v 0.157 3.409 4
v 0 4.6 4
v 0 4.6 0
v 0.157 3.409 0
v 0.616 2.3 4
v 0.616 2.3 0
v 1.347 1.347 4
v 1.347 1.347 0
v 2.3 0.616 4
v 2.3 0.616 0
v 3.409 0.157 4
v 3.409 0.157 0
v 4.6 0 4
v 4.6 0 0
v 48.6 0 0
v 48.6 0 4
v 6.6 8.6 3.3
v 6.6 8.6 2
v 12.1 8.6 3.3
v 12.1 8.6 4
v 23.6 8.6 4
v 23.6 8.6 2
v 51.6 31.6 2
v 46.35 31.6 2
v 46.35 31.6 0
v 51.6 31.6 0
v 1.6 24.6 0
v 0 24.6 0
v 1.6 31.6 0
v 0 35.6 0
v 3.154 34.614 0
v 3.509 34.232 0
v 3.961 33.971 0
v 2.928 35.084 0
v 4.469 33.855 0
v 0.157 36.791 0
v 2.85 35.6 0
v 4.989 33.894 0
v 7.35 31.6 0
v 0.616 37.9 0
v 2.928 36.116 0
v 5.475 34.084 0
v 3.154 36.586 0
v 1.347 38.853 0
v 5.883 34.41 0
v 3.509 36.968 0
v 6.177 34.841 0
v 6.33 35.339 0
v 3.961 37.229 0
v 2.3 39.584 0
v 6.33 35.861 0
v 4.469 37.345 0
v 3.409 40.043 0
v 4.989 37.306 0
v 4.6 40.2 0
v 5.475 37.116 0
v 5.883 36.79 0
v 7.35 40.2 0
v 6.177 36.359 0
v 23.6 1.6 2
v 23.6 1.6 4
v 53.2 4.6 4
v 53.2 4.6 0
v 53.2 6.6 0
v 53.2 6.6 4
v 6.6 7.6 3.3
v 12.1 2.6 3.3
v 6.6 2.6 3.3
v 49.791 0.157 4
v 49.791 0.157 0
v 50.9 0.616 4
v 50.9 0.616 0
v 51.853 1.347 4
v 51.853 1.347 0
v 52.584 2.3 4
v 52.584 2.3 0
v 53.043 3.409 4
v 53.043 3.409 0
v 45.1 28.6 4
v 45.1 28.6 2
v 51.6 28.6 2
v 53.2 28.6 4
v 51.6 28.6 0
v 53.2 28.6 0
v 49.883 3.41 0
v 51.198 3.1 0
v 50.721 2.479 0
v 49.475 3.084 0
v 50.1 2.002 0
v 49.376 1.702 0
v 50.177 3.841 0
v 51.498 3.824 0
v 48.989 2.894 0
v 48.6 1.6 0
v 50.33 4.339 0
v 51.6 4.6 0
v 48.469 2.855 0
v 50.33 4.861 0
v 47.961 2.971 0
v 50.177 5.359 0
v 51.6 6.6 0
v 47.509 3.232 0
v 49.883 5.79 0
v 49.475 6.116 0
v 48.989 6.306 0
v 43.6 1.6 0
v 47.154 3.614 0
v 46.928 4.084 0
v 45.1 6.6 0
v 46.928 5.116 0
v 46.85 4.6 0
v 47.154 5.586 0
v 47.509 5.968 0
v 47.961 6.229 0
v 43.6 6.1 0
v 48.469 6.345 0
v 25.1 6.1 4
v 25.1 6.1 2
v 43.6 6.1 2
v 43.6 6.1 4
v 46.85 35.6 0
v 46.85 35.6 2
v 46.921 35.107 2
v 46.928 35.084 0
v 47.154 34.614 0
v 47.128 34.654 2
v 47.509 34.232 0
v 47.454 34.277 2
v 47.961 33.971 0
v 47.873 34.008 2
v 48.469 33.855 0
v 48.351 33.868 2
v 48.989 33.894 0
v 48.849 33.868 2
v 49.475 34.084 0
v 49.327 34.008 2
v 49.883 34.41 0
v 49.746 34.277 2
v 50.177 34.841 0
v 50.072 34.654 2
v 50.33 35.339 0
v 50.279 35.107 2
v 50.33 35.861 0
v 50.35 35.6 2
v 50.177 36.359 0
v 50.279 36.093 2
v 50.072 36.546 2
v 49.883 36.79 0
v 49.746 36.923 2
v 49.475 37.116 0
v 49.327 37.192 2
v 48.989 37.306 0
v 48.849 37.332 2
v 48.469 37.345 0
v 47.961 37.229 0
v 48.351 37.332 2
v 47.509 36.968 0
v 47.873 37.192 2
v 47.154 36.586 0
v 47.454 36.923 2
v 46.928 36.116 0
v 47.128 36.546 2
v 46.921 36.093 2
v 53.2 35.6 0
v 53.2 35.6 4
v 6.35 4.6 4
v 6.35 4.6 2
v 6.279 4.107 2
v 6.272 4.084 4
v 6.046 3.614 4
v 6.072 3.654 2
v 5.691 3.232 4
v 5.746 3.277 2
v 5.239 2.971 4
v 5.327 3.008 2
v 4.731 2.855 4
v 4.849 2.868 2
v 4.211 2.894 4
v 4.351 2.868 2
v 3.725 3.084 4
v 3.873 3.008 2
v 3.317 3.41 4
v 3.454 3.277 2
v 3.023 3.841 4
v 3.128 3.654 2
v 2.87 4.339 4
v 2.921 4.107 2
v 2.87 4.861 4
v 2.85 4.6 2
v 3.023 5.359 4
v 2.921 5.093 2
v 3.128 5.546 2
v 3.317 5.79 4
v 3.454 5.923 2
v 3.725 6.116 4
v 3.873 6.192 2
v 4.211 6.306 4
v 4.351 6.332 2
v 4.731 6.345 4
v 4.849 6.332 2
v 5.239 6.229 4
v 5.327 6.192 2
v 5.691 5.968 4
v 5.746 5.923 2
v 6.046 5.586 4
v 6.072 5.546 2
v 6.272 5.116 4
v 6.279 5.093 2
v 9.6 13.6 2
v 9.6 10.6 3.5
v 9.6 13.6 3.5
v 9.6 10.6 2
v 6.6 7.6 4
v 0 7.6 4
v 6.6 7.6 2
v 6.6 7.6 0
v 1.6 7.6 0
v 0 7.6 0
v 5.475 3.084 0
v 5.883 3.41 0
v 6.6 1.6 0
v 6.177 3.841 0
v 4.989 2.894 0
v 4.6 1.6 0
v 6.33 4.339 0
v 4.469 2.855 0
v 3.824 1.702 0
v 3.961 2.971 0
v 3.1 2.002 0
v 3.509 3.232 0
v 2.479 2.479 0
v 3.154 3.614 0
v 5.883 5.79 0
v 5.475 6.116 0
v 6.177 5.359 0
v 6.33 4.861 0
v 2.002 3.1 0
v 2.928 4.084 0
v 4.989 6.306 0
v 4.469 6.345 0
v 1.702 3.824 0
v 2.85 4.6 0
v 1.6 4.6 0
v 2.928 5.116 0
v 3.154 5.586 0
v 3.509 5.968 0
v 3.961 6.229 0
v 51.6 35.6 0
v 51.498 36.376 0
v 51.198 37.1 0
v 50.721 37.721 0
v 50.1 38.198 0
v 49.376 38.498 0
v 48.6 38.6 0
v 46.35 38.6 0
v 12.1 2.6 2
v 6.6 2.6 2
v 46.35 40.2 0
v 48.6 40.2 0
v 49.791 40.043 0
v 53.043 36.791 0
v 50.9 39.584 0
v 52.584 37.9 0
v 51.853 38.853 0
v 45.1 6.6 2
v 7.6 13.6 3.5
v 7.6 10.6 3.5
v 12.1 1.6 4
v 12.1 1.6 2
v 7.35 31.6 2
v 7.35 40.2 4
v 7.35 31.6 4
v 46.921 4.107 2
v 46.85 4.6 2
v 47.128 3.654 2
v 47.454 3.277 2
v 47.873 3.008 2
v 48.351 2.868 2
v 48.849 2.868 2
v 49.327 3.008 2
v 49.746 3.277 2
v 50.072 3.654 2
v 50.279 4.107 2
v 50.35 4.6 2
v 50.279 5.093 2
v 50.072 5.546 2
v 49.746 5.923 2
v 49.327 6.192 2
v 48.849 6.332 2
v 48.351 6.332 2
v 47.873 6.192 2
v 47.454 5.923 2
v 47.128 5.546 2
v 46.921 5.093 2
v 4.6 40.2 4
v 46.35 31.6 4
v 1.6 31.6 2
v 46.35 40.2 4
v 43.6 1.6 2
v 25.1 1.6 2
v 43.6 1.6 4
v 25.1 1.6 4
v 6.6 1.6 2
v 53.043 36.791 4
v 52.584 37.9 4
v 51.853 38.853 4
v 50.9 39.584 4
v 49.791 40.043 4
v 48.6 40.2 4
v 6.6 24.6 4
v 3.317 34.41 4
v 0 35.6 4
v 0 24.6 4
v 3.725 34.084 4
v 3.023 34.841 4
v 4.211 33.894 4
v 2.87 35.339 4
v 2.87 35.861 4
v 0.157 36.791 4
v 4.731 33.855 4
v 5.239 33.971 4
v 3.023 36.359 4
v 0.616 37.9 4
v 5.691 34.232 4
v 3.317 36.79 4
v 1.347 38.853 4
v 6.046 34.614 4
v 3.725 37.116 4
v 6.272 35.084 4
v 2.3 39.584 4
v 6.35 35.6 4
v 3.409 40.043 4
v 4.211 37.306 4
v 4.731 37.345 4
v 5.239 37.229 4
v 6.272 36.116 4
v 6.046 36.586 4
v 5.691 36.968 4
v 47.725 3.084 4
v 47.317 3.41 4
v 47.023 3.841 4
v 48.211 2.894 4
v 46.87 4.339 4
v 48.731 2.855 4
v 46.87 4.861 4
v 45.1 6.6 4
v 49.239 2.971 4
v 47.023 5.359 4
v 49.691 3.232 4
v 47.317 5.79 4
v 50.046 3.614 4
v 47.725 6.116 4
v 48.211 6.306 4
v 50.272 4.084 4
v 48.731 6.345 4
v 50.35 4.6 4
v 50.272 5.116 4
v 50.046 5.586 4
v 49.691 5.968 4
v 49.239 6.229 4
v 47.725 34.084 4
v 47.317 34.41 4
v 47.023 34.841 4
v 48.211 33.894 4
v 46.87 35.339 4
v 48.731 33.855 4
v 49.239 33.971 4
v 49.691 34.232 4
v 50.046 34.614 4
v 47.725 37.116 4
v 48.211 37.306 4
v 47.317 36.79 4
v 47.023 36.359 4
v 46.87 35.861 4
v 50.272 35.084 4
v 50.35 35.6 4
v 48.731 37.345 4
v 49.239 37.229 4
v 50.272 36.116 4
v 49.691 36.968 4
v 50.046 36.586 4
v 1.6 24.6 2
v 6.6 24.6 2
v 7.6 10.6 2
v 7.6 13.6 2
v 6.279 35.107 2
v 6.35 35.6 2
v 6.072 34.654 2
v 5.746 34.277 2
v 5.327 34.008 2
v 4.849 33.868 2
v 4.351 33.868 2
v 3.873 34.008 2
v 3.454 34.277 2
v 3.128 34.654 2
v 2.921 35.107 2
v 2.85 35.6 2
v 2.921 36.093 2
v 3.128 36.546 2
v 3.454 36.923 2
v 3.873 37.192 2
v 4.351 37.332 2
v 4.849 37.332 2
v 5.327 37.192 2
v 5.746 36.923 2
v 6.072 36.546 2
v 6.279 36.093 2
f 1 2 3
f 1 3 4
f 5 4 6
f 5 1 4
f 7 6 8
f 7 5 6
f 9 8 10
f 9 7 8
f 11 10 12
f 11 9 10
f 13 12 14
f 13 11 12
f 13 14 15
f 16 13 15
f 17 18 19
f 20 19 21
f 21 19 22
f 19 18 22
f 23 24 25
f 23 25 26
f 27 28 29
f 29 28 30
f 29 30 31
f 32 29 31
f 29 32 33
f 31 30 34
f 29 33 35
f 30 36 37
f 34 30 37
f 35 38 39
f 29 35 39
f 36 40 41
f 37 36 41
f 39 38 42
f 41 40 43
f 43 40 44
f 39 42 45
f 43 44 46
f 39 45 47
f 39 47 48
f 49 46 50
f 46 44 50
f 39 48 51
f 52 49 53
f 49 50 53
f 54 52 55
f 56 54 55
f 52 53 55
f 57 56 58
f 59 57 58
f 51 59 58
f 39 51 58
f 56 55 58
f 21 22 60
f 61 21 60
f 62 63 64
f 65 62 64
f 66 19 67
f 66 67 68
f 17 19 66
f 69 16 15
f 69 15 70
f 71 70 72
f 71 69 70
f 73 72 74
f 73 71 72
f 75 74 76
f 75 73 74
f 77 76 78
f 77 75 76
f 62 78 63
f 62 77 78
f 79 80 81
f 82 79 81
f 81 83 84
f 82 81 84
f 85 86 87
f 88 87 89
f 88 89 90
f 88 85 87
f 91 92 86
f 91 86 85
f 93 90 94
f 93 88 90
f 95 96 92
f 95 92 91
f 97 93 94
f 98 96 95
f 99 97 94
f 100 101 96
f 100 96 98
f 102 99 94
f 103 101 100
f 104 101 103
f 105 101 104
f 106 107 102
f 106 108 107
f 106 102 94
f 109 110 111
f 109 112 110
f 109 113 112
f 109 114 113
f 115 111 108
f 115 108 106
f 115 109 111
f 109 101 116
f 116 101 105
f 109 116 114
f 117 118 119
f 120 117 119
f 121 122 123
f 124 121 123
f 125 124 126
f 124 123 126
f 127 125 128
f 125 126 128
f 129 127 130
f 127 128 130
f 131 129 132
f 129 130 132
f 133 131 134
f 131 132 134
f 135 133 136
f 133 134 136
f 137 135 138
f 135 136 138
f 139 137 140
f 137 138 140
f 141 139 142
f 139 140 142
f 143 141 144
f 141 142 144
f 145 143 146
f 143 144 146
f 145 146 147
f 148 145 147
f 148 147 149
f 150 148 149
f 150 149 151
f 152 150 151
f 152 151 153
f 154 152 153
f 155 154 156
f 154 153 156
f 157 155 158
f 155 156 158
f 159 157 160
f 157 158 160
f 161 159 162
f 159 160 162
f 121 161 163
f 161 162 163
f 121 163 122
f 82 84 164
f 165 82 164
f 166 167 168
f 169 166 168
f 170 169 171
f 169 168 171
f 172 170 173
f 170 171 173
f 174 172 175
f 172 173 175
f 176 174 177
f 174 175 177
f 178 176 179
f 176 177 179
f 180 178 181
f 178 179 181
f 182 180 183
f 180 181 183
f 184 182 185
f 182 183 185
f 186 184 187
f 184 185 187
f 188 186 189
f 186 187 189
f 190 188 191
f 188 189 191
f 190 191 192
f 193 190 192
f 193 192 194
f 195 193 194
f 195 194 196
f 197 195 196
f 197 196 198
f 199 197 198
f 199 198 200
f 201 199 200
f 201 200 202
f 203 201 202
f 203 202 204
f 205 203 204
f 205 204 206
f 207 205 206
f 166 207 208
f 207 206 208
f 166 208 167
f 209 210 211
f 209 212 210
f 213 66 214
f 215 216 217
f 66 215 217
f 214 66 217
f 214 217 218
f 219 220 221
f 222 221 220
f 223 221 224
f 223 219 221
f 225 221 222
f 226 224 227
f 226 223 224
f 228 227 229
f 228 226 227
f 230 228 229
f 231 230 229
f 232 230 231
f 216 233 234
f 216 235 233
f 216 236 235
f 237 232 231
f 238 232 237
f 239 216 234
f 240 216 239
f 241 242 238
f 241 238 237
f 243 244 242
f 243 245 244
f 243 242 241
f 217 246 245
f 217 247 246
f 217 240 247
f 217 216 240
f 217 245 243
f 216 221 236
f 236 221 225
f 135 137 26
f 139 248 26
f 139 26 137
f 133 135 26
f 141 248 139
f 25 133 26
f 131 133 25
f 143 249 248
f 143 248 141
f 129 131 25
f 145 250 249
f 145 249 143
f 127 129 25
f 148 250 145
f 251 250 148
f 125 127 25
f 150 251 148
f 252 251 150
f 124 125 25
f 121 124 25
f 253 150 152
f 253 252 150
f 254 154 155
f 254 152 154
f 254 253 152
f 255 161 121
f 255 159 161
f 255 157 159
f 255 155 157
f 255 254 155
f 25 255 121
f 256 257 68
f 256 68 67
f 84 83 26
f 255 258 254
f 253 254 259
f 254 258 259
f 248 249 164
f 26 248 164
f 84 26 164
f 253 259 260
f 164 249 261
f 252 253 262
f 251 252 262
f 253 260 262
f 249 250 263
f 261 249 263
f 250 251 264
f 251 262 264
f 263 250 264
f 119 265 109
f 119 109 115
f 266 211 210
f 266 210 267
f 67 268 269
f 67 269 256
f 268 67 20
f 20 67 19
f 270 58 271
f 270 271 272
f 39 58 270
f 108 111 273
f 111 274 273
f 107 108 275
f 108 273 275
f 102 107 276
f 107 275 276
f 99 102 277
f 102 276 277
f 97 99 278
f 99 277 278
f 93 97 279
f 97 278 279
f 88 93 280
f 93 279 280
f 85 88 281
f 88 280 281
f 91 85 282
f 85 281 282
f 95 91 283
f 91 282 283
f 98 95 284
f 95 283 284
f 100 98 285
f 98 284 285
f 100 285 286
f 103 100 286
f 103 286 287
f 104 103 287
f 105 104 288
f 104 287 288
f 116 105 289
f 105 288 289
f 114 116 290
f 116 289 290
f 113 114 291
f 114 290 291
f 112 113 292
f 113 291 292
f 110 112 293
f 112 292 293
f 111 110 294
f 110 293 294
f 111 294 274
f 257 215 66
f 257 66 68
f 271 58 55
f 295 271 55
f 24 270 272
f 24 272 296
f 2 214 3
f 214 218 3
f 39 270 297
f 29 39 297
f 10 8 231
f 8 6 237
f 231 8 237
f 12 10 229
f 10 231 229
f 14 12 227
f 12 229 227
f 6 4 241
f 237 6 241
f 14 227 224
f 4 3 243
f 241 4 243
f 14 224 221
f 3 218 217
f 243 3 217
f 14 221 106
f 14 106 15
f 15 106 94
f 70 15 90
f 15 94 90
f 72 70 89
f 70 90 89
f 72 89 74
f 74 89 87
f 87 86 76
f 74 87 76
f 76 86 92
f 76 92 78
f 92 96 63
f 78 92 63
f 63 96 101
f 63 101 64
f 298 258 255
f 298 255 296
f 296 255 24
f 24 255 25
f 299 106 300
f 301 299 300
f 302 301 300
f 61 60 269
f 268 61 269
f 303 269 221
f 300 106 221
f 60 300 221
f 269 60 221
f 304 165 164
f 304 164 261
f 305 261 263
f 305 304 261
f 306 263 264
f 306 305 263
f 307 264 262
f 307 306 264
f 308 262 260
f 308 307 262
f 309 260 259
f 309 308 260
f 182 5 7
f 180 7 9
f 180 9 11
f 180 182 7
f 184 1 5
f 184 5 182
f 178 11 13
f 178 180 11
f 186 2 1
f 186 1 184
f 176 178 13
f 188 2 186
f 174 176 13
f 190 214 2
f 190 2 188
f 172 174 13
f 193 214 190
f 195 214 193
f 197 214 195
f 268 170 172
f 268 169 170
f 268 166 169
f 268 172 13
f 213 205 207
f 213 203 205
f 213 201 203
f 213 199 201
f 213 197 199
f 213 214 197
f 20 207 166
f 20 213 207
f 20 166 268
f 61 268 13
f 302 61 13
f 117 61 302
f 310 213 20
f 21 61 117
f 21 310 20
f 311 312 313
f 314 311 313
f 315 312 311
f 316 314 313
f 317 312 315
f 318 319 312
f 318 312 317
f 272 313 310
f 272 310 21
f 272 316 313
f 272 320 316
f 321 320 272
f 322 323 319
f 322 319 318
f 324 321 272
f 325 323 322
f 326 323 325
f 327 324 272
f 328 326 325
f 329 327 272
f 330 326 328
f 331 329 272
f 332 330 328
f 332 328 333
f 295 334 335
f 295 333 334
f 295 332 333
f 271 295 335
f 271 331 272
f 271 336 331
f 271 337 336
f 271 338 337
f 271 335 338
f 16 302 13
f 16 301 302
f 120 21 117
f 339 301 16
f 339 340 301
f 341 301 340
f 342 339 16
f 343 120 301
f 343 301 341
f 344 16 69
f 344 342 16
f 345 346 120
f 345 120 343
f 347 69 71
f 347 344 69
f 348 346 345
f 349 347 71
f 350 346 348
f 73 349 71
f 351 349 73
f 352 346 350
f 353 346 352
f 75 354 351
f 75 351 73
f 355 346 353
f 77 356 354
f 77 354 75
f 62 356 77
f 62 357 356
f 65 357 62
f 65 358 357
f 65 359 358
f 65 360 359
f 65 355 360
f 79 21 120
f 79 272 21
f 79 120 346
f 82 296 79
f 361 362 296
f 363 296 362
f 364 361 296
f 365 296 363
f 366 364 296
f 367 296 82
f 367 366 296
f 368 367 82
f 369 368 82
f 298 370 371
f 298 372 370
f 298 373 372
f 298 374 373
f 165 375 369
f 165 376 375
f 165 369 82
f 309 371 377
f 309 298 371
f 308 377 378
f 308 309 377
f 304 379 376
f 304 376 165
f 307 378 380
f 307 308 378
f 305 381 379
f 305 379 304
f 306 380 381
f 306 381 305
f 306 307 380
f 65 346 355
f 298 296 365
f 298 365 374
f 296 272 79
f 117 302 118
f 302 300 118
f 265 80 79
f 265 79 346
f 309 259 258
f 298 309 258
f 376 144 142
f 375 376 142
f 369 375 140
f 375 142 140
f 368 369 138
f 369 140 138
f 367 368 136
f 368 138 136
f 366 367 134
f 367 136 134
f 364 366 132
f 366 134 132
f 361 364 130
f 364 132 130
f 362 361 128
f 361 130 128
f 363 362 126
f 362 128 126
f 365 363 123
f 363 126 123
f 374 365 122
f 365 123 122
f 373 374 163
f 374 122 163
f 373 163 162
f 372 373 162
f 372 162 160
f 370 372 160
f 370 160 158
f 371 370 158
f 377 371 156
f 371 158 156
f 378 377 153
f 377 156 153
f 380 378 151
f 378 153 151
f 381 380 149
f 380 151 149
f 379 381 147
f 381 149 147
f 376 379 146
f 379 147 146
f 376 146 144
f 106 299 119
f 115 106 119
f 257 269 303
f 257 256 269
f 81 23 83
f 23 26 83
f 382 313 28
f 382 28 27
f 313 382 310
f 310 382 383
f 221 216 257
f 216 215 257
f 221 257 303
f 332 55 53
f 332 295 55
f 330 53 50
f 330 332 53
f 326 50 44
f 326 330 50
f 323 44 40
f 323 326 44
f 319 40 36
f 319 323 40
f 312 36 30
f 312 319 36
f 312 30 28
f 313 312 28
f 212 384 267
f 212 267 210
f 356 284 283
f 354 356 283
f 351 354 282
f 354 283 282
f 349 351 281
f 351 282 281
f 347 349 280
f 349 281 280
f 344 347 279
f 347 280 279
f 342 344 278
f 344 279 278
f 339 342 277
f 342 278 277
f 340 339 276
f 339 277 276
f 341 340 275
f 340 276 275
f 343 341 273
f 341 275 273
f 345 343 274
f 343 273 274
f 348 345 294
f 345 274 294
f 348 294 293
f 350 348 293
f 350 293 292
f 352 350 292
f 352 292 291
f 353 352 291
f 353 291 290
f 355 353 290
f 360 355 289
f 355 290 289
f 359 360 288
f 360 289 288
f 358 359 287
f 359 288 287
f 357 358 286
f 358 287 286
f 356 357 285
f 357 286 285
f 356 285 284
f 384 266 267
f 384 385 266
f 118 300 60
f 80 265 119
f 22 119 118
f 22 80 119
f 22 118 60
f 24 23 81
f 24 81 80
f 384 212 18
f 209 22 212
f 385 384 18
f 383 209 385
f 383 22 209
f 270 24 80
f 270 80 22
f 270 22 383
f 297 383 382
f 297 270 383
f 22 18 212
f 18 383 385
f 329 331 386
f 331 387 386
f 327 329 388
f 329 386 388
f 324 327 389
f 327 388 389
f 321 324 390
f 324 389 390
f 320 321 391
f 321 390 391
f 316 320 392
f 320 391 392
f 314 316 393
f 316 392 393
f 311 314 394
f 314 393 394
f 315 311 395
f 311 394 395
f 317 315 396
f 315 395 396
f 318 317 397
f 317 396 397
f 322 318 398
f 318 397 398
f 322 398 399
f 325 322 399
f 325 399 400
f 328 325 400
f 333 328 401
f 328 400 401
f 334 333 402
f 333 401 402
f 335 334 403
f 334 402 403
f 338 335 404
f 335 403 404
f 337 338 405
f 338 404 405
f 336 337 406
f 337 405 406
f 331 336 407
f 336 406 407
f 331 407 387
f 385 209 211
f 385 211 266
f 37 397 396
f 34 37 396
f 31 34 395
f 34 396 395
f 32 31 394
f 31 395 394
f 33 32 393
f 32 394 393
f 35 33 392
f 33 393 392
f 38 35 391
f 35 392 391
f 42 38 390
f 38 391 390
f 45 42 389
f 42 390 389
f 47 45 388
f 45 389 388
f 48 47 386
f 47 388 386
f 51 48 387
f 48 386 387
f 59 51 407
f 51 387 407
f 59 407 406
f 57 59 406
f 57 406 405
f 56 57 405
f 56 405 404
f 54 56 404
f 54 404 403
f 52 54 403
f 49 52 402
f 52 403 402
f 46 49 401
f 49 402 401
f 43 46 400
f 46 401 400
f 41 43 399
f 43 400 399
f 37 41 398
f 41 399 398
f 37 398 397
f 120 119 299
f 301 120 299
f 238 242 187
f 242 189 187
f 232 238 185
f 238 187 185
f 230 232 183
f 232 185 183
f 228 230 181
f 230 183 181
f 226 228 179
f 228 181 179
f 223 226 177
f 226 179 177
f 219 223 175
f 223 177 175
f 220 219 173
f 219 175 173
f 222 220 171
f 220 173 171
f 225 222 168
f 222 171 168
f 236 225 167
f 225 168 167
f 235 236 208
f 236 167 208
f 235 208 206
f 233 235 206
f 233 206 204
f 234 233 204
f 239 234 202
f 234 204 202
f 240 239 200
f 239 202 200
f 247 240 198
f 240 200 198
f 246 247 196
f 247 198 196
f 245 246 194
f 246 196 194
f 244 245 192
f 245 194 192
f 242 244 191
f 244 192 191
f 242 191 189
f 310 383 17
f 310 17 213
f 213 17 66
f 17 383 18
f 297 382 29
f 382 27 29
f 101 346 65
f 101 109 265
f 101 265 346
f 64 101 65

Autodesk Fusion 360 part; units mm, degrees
sketch "Sketch1" plane through (0, 0, 0) normal (0, 0, 1) x (1, 0, 0)
  line L0 (0, 0) -> (53.2, 0)
  line L1 (53.2, 0) -> (53.2, 40.2)
  line L2 (53.2, 40.2) -> (0, 40.2)
  line L3 (0, 40.2) -> (0, 0)
  circle A0 centre (4.6, 4.6) radius 1.75
  circle A1 centre (4.6, 35.6) radius 1.75
  circle A2 centre (48.6, 35.6) radius 1.75
  circle A3 centre (48.6, 4.6) radius 1.75
  dimension "d1" = 53.2
  dimension "d2" = 40.2
  dimension "d3" = 4.6
  dimension "d4" = 4.6
  dimension "d5" = 4.6
  dimension "d6" = 4.6
  dimension "d7" = 4.6
  dimension "d8" = 4.6
  dimension "d9" = 4.6
  dimension "d10" = 4.6
  dimension "d11" = 3.5
  dimension "d12" = 3.5
  dimension "d13" = 3.5
  dimension "d14" = 3.5
extrude "Extrude1" add sketch "Sketch1" along normal blind 4
fillet "Fillet1" radius 4.6 4 edges at (0, 40.2, 2) (0, 0, 2) (53.2, 0, 2) (53.2, 40.2, 2)
sketch "Sketch2" plane through (0, 0, 0) normal (0, 0, -1) x (-1, 0, 0)
  arc A0 (-48.6, 40.2) -> (-53.2, 35.6) centre (-48.6, 35.6) ccw
  line L0 (-53.2, 35.6) -> (-53.2, 4.6)
  arc A1 (-53.2, 4.6) -> (-48.6, 0) centre (-48.6, 4.6) ccw
  line L1 (-48.6, 0) -> (-4.6, 0)
  arc A2 (-4.6, 0) -> (0, 4.6) centre (-4.6, 4.6) ccw
  line L2 (0, 4.6) -> (0, 35.6)
  arc A3 (0, 35.6) -> (-4.6, 40.2) centre (-4.6, 35.6) ccw
  line L3 (-4.6, 40.2) -> (-48.6, 40.2)
  circle A4 centre (-48.6, 4.6) radius 1.75
  circle A5 centre (-48.6, 35.6) radius 1.75
  circle A6 centre (-4.6, 4.6) radius 1.75
  circle A7 centre (-4.6, 35.6) radius 1.75
  line L4 (-51.6, 35.6) -> (-51.6, 4.6)
  arc A8 (-51.6, 4.6) -> (-48.6, 1.6) centre (-48.6, 4.6) ccw
  line L5 (-48.6, 1.6) -> (-4.6, 1.6)
  arc A9 (-4.6, 1.6) -> (-1.6, 4.6) centre (-4.6, 4.6) ccw
  line L6 (-1.6, 4.6) -> (-1.6, 35.6)
  arc A10 (-1.6, 35.6) -> (-4.6, 38.6) centre (-4.6, 35.6) ccw
  line L7 (-4.6, 38.6) -> (-48.6, 38.6)
  arc A11 (-48.6, 38.6) -> (-51.6, 35.6) centre (-48.6, 35.6) ccw
  dimension "d18" = 1.6
extrude "Extrude2" cut sketch "Sketch2" against normal blind 2 contours L4 A8 L5 A9 L6 A10 L7 A11
sketch "Sketch3" plane through (0, 0, 0) normal (0, 0, -1) x (-1, 0, 0)
  line L0 (-51.6, 4.6) -> (-51.6, 35.6)
  arc A0 (-48.6, 38.6) -> (-51.6, 35.6) centre (-48.6, 35.6) ccw
  line L1 (-48.6, 38.6) -> (-4.6, 38.6)
  arc A1 (-1.6, 35.6) -> (-4.6, 38.6) centre (-4.6, 35.6) ccw
  line L2 (-1.6, 35.6) -> (-1.6, 4.6)
  arc A2 (-4.6, 1.6) -> (-1.6, 4.6) centre (-4.6, 4.6) ccw
  line L3 (-4.6, 1.6) -> (-48.6, 1.6)
  arc A3 (-51.6, 4.6) -> (-48.6, 1.6) centre (-48.6, 4.6) ccw
  arc A4 (-48.6, 40.2) -> (-53.2, 35.6) centre (-48.6, 35.6) ccw
  line L4 (-53.2, 35.6) -> (-53.2, 4.6)
  arc A5 (-53.2, 4.6) -> (-48.6, 0) centre (-48.6, 4.6) ccw
  line L5 (-48.6, 0) -> (-4.6, 0)
  arc A6 (-4.6, 0) -> (0, 4.6) centre (-4.6, 4.6) ccw
  line L6 (0, 4.6) -> (0, 35.6)
  arc A7 (0, 35.6) -> (-4.6, 40.2) centre (-4.6, 35.6) ccw
  line L7 (-4.6, 40.2) -> (-48.6, 40.2)
  line L8 (0, 24.6) -> (-1.6, 24.6)
  line L9 (0, 7.6) -> (-1.6, 7.6)
  line L10 (-53.2, 28.6) -> (-51.6, 28.6)
  line L11 (-53.2, 6.6) -> (-51.6, 6.6)
  line L12 (-46.35, 40.2) -> (-46.35, 38.6)
  line L13 (-7.35, 40.2) -> (-7.35, 38.6)
  dimension "d21" = 17
  dimension "d22" = 11
  dimension "d25" = 5
  dimension "d26" = 10
  dimension "d27" = 5.75
  dimension "d73" = 39
extrude "Extrude3" cut sketch "Sketch3" against normal blind 2 contours L0 L4 L10 L11 | L2 L6 L8 L9 | L1 L7 L12 L13
sketch "Sketch4" plane through (0, 0, 2) normal (0, 0, -1) x (-1, 0, 0)
  circle A0 centre (-48.6, 4.6) radius 1.75
  circle A1 centre (-4.6, 35.6) radius 1.75
  circle A2 centre (-4.6, 4.6) radius 1.75
  circle A3 centre (-48.6, 35.6) radius 1.75
  line L0 (-53.2, 28.6) -> (-53.2, 6.6)
  line L1 (0, 7.6) -> (0, 24.6)
  line L2 (-7.35, 40.2) -> (-46.35, 40.2)
  arc A4 (-48.6, 38.6) -> (-51.6, 35.6) centre (-48.6, 35.6) ccw
  line L3 (-51.6, 35.6) -> (-51.6, 28.6)
  line L4 (-51.6, 28.6) -> (-53.2, 28.6)
  line L5 (-53.2, 6.6) -> (-51.6, 6.6)
  line L6 (-51.6, 6.6) -> (-51.6, 4.6)
  arc A5 (-51.6, 4.6) -> (-48.6, 1.6) centre (-48.6, 4.6) ccw
  line L7 (-48.6, 1.6) -> (-4.6, 1.6)
  arc A6 (-4.6, 1.6) -> (-1.6, 4.6) centre (-4.6, 4.6) ccw
  line L8 (-1.6, 4.6) -> (-1.6, 7.6)
  line L9 (-1.6, 7.6) -> (0, 7.6)
  line L10 (0, 24.6) -> (-1.6, 24.6)
  line L11 (-1.6, 24.6) -> (-1.6, 35.6)
  arc A7 (-1.6, 35.6) -> (-4.6, 38.6) centre (-4.6, 35.6) ccw
  line L12 (-4.6, 38.6) -> (-7.35, 38.6)
  line L13 (-7.35, 38.6) -> (-7.35, 40.2)
  line L14 (-46.35, 40.2) -> (-46.35, 38.6)
  line L15 (-46.35, 38.6) -> (-48.6, 38.6)
  line L16 (-51.6, 28.6) -> (-45.1, 28.6)
  line L17 (-45.1, 28.6) -> (-45.1, 6.6)
  line L18 (-45.1, 6.6) -> (-51.6, 6.6)
  line L19 (-7.35, 38.6) -> (-7.35, 31.6)
  line L20 (-7.35, 31.6) -> (-46.35, 31.6)
  line L21 (-46.35, 31.6) -> (-46.35, 38.6)
  line L22 (-1.6, 24.6) -> (-6.6, 24.6)
  line L23 (-6.6, 24.6) -> (-6.6, 7.6)
  line L24 (-6.6, 7.6) -> (-1.6, 7.6)
  line L25 (-12.1, 1.6) -> (-12.1, 8.6)
  line L26 (-12.1, 8.6) -> (-23.6, 8.6)
  line L27 (-23.6, 8.6) -> (-23.6, 1.6)
  line L28 (-25.1, 1.6) -> (-25.1, 6.1)
  line L29 (-25.1, 6.1) -> (-43.6, 6.1)
  line L30 (-43.6, 6.1) -> (-43.6, 1.6)
  dimension "d74" = 6.5
  dimension "d75" = 7
  dimension "d76" = 5
  dimension "d77" = 10.5
  dimension "d78" = 11.5
  dimension "d79" = 7
  dimension "d80" = 4.5
  dimension "d81" = 23.5
  dimension "d82" = 18.5
extrude "Extrude4" cut sketch "Sketch4" against normal blind 2 contours L0 L4 L5 L16 L17 L18 | L2 L13 L14 L19 L20 L21 | L7 L28 L29 L30 | L7 L25 L26 L27 | L1 L9 L10 L22 L23 L24
sketch "Sketch5" plane through (0, 0, 2) normal (0, 0, -1) x (-1, 0, 0)
  line L0 (-51.6, 35.6) -> (-51.6, 28.6)
  line L1 (-48.6, 1.6) -> (-43.6, 1.6)
  line L2 (-1.6, 7.6) -> (-6.6, 7.6)
  line L3 (-6.6, 24.6) -> (-1.6, 24.6)
  line L4 (-7.35, 38.6) -> (-7.35, 31.6)
  line L5 (-4.6, 38.6) -> (-7.35, 38.6)
  line L6 (-46.35, 31.6) -> (-46.35, 38.6)
  line L7 (-51.6, 28.6) -> (-45.1, 28.6)
  line L8 (-45.1, 6.6) -> (-51.6, 6.6)
  circle A0 centre (-48.6, 35.6) radius 1.75
  circle A1 centre (-4.6, 4.6) radius 1.75
  circle A2 centre (-4.6, 35.6) radius 1.75
  circle A3 centre (-48.6, 4.6) radius 1.75
  line L9 (-12.6, 8.6) -> (-6.6, 8.6)
  line L10 (-6.6, 8.6) -> (-6.6, 2.6)
  line L11 (-6.6, 2.6) -> (-12.6, 2.6)
  line L12 (-12.6, 2.6) -> (-12.6, 8.6)
  arc A4 (-4.6, 1.6) -> (-1.6, 4.6) centre (-4.6, 4.6) ccw
  line L13 (-1.6, 4.6) -> (-1.6, 7.6)
  line L14 (-1.6, 24.6) -> (-1.6, 35.6)
  arc A5 (-1.6, 35.6) -> (-4.6, 38.6) centre (-4.6, 35.6) ccw
  line L15 (-46.35, 38.6) -> (-48.6, 38.6)
  arc A6 (-48.6, 38.6) -> (-51.6, 35.6) centre (-48.6, 35.6) ccw
  line L16 (-51.6, 6.6) -> (-51.6, 4.6)
  arc A7 (-51.6, 4.6) -> (-48.6, 1.6) centre (-48.6, 4.6) ccw
  line L17 (-45.1, 28.6) -> (-45.1, 6.6)
  line L18 (-43.6, 1.6) -> (-43.6, 6.1)
  line L19 (-43.6, 6.1) -> (-25.1, 6.1)
  line L20 (-25.1, 6.1) -> (-25.1, 1.6)
  line L21 (-25.1, 1.6) -> (-23.6, 1.6)
  line L22 (-23.6, 1.6) -> (-23.6, 8.6)
  line L23 (-23.6, 8.6) -> (-12.1, 8.6)
  line L24 (-12.1, 8.6) -> (-12.1, 1.6)
  line L25 (-12.1, 1.6) -> (-4.6, 1.6)
  line L26 (-6.6, 7.6) -> (-6.6, 24.6)
  line L27 (-7.35, 31.6) -> (-46.35, 31.6)
  dimension "d49" = 6
  dimension "d51" = 6
  dimension "d83" = 1
  dimension "d84" = 5
extrude "Extrude5" cut sketch "Sketch5" against normal blind 1.3 contours L9 L10 L11 L24 L26 | L9 L11 L12 L23 L24
sketch "Sketch8" plane through (0, 0, 2) normal (0, 0, -1) x (-1, 0, 0)
  line L0 (-6.6, 24.6) -> (-1.6, 24.6)
  line L1 (-7.35, 38.6) -> (-7.35, 31.6)
  line L2 (-4.6, 38.6) -> (-7.35, 38.6)
  line L3 (-46.35, 31.6) -> (-46.35, 38.6)
  line L4 (-51.6, 28.6) -> (-45.1, 28.6)
  line L5 (-45.1, 6.6) -> (-51.6, 6.6)
  line L6 (-51.6, 35.6) -> (-51.6, 28.6)
  line L7 (-48.6, 1.6) -> (-43.6, 1.6)
  line L8 (-23.6, 8.6) -> (-6.6, 8.6)
  circle A0 centre (-48.6, 35.6) radius 1.75
  circle A1 centre (-4.6, 35.6) radius 1.75
  circle A2 centre (-48.6, 4.6) radius 1.75
  arc A3 (-1.6, 35.6) -> (-4.6, 38.6) centre (-4.6, 35.6) ccw
  line L9 (-46.35, 38.6) -> (-48.6, 38.6)
  arc A4 (-48.6, 38.6) -> (-51.6, 35.6) centre (-48.6, 35.6) ccw
  line L10 (-51.6, 6.6) -> (-51.6, 4.6)
  arc A5 (-51.6, 4.6) -> (-48.6, 1.6) centre (-48.6, 4.6) ccw
  line L11 (-6.6, 8.6) -> (-6.6, 24.6)
  line L12 (-7.35, 31.6) -> (-46.35, 31.6)
  line L13 (-45.1, 28.6) -> (-45.1, 6.6)
  line L14 (-43.6, 1.6) -> (-43.6, 6.1)
  line L15 (-43.6, 6.1) -> (-25.1, 6.1)
  line L16 (-25.1, 6.1) -> (-25.1, 1.6)
  line L17 (-25.1, 1.6) -> (-23.6, 1.6)
  line L18 (-23.6, 1.6) -> (-23.6, 8.6)
  line L19 (-1.6, 24.6) -> (-1.6, 35.6)
  line L20 (-45.1, 6.6) -> (-43.6, 6.1)
  line L21 (-7.35, 31.6) -> (-1.6, 31.6)
  line L22 (-46.35, 31.6) -> (-46.6643, 31.6)
  line L23 (-46.6643, 31.6) -> (-51.6, 31.6)
  line L24 (-6.6, 7.6) -> (-6.6, 2.6)
  line L25 (-6.6, 2.6) -> (-12.1, 2.6)
  line L26 (-12.1, 2.6) -> (-12.1, 1.6)
  line L27 (-12.1, 1.6) -> (-4.6, 1.6)
  arc A6 (-4.6, 1.6) -> (-1.6, 4.6) centre (-4.6, 4.6) ccw
  line L28 (-1.6, 4.6) -> (-1.6, 7.6)
  line L29 (-1.6, 7.6) -> (-6.6, 7.6)
  circle A7 centre (-4.6, 4.6) radius 1.75
  line L30 (-6.6, 2.6) -> (-6.6, 1.6)
extrude "Extrude8" add sketch "Sketch8" along normal blind 2 contours L1 L2 A3 L19 L21 | L3 L6 L9 A4 L22 L23 | L5 L7 L10 A5 L14 L20 | L24 L27 A6 L28 L29 L30
sketch "Sketch9" plane through (0, 0, 2) normal (0, 0, -1) x (-1, 0, 0)
  line L0 (-45.1, 6.6) -> (-43.6, 6.1)
  line L1 (-43.6, 6.1) -> (-25.1, 6.1)
  line L2 (-25.1, 6.1) -> (-25.1, 1.6)
  line L3 (-25.1, 1.6) -> (-23.6, 1.6)
  line L4 (-23.6, 1.6) -> (-23.6, 8.6)
  line L5 (-23.6, 8.6) -> (-6.6, 8.6)
  line L6 (-6.6, 8.6) -> (-6.6, 24.6)
  line L7 (-6.6, 24.6) -> (-1.6, 24.6)
  line L8 (-1.6, 24.6) -> (-1.6, 31.6)
  line L9 (-1.6, 31.6) -> (-7.35, 31.6)
  line L10 (-7.35, 31.6) -> (-46.35, 31.6)
  line L11 (-46.35, 31.6) -> (-51.6, 31.6)
  line L12 (-51.6, 31.6) -> (-51.6, 28.6)
  line L13 (-51.6, 28.6) -> (-45.1, 28.6)
  line L14 (-45.1, 28.6) -> (-45.1, 6.6)
  line L15 (-7.6, 10.6) -> (-9.6, 10.6)
  line L16 (-9.6, 10.6) -> (-9.6, 13.6)
  line L17 (-9.6, 13.6) -> (-7.6, 13.6)
  line L18 (-7.6, 13.6) -> (-7.6, 10.6)
  dimension "d85" = 2
  dimension "d86" = 1
  dimension "d87" = 3
  dimension "d88" = 2
extrude "Extrude9" cut sketch "Sketch9" against normal blind 1.5 contours L15 L16 L17 L18
equation "d1 = 50 mm + ( ( 2 * 1.6 ) * 1 mm )"
equation "d2 = 37 mm + ( ( 2 * 1.6 ) * 1 mm )"
equation "d3 = 3 mm + 1.6 mm"
equation "d4 = d3"
equation "d5 = d4"
equation "d6 = d3"
equation "d7 = d3"
equation "d8 = d7"
equation "d9 = d4"
equation "d10 = d5"
equation "d17 = 3 mm + 1.6 mm"
